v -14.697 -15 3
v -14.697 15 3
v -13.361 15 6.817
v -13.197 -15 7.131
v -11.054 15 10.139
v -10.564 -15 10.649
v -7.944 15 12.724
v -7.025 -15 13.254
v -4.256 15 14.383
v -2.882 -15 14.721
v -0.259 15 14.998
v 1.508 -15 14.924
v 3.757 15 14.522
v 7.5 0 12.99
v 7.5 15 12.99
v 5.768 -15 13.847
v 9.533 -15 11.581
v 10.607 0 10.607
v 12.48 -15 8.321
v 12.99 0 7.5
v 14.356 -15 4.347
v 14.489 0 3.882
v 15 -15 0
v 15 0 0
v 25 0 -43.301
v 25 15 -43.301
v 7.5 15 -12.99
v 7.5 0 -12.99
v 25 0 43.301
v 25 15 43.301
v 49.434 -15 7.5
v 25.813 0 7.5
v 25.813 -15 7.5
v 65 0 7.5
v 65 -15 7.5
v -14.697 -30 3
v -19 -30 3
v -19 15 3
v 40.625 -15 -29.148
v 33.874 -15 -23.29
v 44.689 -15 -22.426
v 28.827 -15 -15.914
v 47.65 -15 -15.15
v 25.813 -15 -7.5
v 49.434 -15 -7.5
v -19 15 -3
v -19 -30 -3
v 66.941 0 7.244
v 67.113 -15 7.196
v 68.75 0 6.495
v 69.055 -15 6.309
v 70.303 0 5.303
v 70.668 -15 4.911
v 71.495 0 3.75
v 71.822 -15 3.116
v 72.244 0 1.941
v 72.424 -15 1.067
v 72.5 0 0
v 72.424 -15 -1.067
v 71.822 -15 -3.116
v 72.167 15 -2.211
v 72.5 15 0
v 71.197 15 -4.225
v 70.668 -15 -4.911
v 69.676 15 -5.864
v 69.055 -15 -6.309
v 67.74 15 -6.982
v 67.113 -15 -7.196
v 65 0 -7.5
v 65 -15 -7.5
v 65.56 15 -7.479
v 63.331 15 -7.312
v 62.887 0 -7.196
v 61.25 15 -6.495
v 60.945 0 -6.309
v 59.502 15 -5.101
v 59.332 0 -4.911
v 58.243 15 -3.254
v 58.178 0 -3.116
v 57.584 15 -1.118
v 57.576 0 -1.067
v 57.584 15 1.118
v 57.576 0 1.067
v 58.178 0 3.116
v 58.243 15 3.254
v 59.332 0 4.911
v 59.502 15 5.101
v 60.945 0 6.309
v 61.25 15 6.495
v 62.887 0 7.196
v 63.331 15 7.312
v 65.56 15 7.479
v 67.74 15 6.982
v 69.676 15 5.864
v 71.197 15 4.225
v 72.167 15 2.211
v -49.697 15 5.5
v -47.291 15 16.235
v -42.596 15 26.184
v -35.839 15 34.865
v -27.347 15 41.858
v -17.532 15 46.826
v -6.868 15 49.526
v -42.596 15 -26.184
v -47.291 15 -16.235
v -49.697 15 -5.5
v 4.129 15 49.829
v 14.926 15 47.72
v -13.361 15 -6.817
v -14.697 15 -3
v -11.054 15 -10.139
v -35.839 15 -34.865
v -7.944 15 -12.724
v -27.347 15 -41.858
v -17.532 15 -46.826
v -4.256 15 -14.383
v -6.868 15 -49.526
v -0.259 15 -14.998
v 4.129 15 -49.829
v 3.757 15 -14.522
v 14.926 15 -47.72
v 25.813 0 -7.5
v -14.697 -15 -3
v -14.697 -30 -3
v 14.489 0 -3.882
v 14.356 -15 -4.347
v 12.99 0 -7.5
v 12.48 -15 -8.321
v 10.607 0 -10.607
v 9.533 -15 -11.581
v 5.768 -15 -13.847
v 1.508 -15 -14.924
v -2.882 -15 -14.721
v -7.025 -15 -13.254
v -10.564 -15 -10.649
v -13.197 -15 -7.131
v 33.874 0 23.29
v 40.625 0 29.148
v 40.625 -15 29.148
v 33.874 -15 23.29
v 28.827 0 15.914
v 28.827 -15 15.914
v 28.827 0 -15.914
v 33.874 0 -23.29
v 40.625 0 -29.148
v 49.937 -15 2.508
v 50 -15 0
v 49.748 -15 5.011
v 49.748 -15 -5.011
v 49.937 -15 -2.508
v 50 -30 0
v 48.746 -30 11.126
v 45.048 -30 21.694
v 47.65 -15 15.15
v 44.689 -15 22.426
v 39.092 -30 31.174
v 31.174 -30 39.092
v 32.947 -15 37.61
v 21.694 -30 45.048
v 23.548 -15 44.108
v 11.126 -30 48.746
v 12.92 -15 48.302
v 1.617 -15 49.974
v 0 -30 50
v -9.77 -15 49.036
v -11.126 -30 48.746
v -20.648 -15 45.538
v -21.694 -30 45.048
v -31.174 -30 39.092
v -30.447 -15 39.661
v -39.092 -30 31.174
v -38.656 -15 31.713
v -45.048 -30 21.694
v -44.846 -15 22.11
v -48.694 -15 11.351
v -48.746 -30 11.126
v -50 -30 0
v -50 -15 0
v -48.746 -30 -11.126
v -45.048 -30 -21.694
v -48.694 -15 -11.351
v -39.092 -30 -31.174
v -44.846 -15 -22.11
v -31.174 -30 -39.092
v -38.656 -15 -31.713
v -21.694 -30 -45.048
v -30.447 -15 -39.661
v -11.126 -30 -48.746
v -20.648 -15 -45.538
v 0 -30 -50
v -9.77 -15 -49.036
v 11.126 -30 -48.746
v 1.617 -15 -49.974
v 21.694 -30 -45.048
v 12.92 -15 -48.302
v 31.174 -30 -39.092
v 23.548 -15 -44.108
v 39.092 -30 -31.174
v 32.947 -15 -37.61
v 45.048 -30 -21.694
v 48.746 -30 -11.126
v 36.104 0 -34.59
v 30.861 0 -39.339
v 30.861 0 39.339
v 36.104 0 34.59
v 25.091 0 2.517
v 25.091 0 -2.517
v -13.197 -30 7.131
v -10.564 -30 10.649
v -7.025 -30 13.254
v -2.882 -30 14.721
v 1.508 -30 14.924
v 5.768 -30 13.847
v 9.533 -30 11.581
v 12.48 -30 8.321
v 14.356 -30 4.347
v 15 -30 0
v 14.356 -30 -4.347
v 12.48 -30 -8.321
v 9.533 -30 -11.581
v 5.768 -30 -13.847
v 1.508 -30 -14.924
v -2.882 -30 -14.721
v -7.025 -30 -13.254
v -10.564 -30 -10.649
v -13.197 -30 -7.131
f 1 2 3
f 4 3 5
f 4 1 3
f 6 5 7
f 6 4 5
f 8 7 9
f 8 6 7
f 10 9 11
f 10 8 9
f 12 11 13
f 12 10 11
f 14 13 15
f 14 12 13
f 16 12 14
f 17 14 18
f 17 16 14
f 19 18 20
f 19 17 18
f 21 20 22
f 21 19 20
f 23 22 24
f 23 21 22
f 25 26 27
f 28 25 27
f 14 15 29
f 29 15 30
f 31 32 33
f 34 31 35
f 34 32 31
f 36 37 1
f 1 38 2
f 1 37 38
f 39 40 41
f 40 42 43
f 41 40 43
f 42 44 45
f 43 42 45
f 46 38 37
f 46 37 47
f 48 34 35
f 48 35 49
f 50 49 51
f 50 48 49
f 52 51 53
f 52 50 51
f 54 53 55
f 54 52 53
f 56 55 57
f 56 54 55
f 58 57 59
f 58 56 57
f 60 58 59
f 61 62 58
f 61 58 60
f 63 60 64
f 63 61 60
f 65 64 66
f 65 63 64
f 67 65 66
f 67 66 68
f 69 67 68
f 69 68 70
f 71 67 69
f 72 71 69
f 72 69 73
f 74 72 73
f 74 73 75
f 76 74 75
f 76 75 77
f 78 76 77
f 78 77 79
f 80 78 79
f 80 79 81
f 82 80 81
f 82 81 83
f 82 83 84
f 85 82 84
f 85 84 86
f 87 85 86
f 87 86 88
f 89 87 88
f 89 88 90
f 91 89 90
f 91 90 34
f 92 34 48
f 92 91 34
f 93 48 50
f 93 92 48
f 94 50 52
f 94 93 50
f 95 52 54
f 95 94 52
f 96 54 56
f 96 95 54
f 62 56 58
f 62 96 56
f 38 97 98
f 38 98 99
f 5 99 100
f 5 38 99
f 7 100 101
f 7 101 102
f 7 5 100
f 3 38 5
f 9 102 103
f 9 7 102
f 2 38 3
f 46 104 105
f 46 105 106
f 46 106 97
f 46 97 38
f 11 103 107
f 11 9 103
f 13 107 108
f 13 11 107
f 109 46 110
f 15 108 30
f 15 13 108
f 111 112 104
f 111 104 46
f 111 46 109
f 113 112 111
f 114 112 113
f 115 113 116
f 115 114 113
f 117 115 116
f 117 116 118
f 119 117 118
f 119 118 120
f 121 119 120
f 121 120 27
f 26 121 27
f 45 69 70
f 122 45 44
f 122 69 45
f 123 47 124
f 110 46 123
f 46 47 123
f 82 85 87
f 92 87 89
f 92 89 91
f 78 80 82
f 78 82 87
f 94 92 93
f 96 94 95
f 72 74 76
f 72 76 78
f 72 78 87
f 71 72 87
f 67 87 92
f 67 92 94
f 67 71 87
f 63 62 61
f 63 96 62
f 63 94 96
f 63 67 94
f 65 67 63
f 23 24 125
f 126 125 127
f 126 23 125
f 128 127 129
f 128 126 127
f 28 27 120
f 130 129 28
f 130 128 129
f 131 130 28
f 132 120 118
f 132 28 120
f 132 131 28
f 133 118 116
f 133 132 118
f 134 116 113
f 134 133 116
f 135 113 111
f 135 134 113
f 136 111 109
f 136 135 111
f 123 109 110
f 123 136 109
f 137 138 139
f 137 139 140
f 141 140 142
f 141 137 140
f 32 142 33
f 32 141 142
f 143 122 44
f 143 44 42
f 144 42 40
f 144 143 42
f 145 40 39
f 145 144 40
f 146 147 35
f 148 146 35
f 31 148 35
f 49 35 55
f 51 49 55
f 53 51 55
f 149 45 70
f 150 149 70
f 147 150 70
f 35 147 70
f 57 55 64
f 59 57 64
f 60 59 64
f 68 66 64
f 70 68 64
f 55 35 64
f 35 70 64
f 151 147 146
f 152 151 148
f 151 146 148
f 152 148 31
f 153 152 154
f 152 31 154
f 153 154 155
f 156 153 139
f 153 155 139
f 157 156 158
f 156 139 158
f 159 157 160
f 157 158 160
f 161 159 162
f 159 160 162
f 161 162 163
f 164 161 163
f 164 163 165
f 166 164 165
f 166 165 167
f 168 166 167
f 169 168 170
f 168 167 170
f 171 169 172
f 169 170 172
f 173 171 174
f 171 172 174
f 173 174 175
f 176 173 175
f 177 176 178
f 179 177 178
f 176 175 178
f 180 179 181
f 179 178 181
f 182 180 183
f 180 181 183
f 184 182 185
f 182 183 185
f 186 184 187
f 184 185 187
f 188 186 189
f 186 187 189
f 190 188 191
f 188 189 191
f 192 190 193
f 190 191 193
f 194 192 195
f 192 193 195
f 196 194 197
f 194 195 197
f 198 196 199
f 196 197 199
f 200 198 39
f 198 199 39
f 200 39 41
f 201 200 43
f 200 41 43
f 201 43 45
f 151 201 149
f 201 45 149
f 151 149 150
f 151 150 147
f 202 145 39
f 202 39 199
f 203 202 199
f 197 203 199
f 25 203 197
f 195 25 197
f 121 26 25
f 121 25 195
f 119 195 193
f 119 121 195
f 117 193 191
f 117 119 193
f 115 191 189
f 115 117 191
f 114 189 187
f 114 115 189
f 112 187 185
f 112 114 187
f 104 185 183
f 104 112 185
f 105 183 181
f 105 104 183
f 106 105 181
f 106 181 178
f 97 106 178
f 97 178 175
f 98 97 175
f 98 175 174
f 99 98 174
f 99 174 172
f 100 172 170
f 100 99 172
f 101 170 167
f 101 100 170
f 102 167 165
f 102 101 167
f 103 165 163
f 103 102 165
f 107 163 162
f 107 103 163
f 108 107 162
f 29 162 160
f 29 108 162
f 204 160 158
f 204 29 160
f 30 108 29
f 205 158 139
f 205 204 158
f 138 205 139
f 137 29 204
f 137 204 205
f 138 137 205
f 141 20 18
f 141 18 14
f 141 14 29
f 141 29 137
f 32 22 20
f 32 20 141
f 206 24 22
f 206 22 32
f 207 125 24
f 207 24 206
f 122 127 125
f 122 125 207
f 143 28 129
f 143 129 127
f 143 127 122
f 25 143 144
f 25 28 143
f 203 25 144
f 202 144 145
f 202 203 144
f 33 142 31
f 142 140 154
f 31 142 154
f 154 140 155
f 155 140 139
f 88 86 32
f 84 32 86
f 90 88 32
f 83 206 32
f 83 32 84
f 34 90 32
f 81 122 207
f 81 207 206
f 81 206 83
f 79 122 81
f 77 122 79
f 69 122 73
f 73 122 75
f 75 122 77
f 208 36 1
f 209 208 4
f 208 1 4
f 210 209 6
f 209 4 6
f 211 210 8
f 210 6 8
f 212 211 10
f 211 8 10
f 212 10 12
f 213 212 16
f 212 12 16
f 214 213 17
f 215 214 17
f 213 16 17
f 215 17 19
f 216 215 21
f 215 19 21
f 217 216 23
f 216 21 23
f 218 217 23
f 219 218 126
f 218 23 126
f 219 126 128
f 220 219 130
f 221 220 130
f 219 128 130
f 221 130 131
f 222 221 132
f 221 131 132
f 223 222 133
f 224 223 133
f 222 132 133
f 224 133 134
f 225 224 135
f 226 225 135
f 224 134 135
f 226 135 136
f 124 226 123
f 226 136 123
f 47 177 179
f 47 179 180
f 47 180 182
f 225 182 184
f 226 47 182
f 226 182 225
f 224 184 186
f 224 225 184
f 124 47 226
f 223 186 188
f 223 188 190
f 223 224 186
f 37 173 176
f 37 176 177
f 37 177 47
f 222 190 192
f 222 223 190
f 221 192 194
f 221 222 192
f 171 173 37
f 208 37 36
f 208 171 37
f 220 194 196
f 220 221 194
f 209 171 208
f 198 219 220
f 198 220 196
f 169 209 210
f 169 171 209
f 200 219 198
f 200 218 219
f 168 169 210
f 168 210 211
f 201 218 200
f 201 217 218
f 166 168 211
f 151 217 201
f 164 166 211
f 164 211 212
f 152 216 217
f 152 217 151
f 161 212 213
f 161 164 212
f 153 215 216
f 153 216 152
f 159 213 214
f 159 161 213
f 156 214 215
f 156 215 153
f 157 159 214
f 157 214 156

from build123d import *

# Parameters (mm, degrees)
SKETCH1_R           = 15
BOSS_EXTRUDE6_DEPTH = 15
BOSS_EXTRUDE7_DEPTH = 15
SKETCH5_R           = 7.5
BOSS_EXTRUDE8_DEPTH = 30
SKETCH6_R           = 50
BOSS_EXTRUDE9_DEPTH = 15
CUT_EXTRUDE1_DEPTH  = 15
SKETCH8_R           = 15
CUT_EXTRUDE2_DEPTH  = 16
SKETCH9_W           = 8
SKETCH9_H           = 6
CUT_EXTRUDE3_DEPTH  = 46


with BuildPart() as part:
    # Sketch1 → Boss-Extrude6 (new body, symmetric)
    with BuildSketch(Plane(origin=(0, 0, 0), x_dir=(1, 0, 0), z_dir=(0, 1, 0))):
        with BuildLine():
            ThreePointArc((40.625, 29.148059541), (-50, 0), (40.625, -29.148059541))
            ThreePointArc((40.625, -29.148059541), (25, 0), (40.625, 29.148059541))
        make_face()
        Circle(SKETCH1_R, mode=Mode.SUBTRACT)
    extrude(amount=BOSS_EXTRUDE6_DEPTH, both=True)

    # Sketch4 → Boss-Extrude7 (add)
    with BuildSketch(Plane(origin=(0, 0, 0), x_dir=(1, 0, 0), z_dir=(0, 1, 0))):
        with BuildLine():
            Line((65, 7.5), (25.813014172, 7.5))
            ThreePointArc((25.813014172, 7.5), (25, 0), (25.813014172, -7.5))
            Line((25.813014172, -7.5), (65, -7.5))
            ThreePointArc((65, -7.5), (72.5, 0), (65, 7.5))
        make_face()
    extrude(amount=-BOSS_EXTRUDE7_DEPTH)

    # Sketch5 → Boss-Extrude8 (add)
    with BuildSketch(Plane(origin=(0, 15, 0), x_dir=(1, 0, 0), z_dir=(0, 1, 0))):
        with Locations((65, 0)):
            Circle(SKETCH5_R)
    extrude(amount=-BOSS_EXTRUDE8_DEPTH)

    # Sketch6 → Boss-Extrude9 (add)
    with BuildSketch(Plane.XZ.offset(15)):
        Circle(SKETCH6_R)
    extrude(amount=BOSS_EXTRUDE9_DEPTH)

    # Sketch7 → Cut-Extrude1 (cut)
    with BuildSketch(Plane(origin=(0, 15, 0), x_dir=(1, 0, 0), z_dir=(0, 1, 0))):
        with BuildLine():
            Line((0, 0), (25, -43.301270189))
            ThreePointArc((25, -43.301270189), (33.566925673, -37.057543103), (40.625, -29.148059541))
            ThreePointArc((40.625, -29.148059541), (25, 0), (40.625, 29.148059541))
            ThreePointArc((40.625, 29.148059541), (33.566925673, 37.057543103), (25, 43.301270189))
            Line((25, 43.301270189), (0, 0))
        make_face()
    extrude(amount=-CUT_EXTRUDE1_DEPTH, mode=Mode.SUBTRACT)

    # Sketch8 → Cut-Extrude2 (cut, through all)
    with BuildSketch(Plane(origin=(0, -15, 0), x_dir=(1, 0, 0), z_dir=(0, 1, 0))):
        Circle(SKETCH8_R)
    extrude(amount=-CUT_EXTRUDE2_DEPTH, mode=Mode.SUBTRACT)

    # Sketch9 → Cut-Extrude3 (cut, through all)
    with BuildSketch(Plane(origin=(0, 15, 0), x_dir=(1, 0, 0), z_dir=(0, 1, 0))):
        with Locations((-15, 0)):
            Rectangle(SKETCH9_W, SKETCH9_H)
    extrude(amount=-CUT_EXTRUDE3_DEPTH, mode=Mode.SUBTRACT)


solid = part.part
